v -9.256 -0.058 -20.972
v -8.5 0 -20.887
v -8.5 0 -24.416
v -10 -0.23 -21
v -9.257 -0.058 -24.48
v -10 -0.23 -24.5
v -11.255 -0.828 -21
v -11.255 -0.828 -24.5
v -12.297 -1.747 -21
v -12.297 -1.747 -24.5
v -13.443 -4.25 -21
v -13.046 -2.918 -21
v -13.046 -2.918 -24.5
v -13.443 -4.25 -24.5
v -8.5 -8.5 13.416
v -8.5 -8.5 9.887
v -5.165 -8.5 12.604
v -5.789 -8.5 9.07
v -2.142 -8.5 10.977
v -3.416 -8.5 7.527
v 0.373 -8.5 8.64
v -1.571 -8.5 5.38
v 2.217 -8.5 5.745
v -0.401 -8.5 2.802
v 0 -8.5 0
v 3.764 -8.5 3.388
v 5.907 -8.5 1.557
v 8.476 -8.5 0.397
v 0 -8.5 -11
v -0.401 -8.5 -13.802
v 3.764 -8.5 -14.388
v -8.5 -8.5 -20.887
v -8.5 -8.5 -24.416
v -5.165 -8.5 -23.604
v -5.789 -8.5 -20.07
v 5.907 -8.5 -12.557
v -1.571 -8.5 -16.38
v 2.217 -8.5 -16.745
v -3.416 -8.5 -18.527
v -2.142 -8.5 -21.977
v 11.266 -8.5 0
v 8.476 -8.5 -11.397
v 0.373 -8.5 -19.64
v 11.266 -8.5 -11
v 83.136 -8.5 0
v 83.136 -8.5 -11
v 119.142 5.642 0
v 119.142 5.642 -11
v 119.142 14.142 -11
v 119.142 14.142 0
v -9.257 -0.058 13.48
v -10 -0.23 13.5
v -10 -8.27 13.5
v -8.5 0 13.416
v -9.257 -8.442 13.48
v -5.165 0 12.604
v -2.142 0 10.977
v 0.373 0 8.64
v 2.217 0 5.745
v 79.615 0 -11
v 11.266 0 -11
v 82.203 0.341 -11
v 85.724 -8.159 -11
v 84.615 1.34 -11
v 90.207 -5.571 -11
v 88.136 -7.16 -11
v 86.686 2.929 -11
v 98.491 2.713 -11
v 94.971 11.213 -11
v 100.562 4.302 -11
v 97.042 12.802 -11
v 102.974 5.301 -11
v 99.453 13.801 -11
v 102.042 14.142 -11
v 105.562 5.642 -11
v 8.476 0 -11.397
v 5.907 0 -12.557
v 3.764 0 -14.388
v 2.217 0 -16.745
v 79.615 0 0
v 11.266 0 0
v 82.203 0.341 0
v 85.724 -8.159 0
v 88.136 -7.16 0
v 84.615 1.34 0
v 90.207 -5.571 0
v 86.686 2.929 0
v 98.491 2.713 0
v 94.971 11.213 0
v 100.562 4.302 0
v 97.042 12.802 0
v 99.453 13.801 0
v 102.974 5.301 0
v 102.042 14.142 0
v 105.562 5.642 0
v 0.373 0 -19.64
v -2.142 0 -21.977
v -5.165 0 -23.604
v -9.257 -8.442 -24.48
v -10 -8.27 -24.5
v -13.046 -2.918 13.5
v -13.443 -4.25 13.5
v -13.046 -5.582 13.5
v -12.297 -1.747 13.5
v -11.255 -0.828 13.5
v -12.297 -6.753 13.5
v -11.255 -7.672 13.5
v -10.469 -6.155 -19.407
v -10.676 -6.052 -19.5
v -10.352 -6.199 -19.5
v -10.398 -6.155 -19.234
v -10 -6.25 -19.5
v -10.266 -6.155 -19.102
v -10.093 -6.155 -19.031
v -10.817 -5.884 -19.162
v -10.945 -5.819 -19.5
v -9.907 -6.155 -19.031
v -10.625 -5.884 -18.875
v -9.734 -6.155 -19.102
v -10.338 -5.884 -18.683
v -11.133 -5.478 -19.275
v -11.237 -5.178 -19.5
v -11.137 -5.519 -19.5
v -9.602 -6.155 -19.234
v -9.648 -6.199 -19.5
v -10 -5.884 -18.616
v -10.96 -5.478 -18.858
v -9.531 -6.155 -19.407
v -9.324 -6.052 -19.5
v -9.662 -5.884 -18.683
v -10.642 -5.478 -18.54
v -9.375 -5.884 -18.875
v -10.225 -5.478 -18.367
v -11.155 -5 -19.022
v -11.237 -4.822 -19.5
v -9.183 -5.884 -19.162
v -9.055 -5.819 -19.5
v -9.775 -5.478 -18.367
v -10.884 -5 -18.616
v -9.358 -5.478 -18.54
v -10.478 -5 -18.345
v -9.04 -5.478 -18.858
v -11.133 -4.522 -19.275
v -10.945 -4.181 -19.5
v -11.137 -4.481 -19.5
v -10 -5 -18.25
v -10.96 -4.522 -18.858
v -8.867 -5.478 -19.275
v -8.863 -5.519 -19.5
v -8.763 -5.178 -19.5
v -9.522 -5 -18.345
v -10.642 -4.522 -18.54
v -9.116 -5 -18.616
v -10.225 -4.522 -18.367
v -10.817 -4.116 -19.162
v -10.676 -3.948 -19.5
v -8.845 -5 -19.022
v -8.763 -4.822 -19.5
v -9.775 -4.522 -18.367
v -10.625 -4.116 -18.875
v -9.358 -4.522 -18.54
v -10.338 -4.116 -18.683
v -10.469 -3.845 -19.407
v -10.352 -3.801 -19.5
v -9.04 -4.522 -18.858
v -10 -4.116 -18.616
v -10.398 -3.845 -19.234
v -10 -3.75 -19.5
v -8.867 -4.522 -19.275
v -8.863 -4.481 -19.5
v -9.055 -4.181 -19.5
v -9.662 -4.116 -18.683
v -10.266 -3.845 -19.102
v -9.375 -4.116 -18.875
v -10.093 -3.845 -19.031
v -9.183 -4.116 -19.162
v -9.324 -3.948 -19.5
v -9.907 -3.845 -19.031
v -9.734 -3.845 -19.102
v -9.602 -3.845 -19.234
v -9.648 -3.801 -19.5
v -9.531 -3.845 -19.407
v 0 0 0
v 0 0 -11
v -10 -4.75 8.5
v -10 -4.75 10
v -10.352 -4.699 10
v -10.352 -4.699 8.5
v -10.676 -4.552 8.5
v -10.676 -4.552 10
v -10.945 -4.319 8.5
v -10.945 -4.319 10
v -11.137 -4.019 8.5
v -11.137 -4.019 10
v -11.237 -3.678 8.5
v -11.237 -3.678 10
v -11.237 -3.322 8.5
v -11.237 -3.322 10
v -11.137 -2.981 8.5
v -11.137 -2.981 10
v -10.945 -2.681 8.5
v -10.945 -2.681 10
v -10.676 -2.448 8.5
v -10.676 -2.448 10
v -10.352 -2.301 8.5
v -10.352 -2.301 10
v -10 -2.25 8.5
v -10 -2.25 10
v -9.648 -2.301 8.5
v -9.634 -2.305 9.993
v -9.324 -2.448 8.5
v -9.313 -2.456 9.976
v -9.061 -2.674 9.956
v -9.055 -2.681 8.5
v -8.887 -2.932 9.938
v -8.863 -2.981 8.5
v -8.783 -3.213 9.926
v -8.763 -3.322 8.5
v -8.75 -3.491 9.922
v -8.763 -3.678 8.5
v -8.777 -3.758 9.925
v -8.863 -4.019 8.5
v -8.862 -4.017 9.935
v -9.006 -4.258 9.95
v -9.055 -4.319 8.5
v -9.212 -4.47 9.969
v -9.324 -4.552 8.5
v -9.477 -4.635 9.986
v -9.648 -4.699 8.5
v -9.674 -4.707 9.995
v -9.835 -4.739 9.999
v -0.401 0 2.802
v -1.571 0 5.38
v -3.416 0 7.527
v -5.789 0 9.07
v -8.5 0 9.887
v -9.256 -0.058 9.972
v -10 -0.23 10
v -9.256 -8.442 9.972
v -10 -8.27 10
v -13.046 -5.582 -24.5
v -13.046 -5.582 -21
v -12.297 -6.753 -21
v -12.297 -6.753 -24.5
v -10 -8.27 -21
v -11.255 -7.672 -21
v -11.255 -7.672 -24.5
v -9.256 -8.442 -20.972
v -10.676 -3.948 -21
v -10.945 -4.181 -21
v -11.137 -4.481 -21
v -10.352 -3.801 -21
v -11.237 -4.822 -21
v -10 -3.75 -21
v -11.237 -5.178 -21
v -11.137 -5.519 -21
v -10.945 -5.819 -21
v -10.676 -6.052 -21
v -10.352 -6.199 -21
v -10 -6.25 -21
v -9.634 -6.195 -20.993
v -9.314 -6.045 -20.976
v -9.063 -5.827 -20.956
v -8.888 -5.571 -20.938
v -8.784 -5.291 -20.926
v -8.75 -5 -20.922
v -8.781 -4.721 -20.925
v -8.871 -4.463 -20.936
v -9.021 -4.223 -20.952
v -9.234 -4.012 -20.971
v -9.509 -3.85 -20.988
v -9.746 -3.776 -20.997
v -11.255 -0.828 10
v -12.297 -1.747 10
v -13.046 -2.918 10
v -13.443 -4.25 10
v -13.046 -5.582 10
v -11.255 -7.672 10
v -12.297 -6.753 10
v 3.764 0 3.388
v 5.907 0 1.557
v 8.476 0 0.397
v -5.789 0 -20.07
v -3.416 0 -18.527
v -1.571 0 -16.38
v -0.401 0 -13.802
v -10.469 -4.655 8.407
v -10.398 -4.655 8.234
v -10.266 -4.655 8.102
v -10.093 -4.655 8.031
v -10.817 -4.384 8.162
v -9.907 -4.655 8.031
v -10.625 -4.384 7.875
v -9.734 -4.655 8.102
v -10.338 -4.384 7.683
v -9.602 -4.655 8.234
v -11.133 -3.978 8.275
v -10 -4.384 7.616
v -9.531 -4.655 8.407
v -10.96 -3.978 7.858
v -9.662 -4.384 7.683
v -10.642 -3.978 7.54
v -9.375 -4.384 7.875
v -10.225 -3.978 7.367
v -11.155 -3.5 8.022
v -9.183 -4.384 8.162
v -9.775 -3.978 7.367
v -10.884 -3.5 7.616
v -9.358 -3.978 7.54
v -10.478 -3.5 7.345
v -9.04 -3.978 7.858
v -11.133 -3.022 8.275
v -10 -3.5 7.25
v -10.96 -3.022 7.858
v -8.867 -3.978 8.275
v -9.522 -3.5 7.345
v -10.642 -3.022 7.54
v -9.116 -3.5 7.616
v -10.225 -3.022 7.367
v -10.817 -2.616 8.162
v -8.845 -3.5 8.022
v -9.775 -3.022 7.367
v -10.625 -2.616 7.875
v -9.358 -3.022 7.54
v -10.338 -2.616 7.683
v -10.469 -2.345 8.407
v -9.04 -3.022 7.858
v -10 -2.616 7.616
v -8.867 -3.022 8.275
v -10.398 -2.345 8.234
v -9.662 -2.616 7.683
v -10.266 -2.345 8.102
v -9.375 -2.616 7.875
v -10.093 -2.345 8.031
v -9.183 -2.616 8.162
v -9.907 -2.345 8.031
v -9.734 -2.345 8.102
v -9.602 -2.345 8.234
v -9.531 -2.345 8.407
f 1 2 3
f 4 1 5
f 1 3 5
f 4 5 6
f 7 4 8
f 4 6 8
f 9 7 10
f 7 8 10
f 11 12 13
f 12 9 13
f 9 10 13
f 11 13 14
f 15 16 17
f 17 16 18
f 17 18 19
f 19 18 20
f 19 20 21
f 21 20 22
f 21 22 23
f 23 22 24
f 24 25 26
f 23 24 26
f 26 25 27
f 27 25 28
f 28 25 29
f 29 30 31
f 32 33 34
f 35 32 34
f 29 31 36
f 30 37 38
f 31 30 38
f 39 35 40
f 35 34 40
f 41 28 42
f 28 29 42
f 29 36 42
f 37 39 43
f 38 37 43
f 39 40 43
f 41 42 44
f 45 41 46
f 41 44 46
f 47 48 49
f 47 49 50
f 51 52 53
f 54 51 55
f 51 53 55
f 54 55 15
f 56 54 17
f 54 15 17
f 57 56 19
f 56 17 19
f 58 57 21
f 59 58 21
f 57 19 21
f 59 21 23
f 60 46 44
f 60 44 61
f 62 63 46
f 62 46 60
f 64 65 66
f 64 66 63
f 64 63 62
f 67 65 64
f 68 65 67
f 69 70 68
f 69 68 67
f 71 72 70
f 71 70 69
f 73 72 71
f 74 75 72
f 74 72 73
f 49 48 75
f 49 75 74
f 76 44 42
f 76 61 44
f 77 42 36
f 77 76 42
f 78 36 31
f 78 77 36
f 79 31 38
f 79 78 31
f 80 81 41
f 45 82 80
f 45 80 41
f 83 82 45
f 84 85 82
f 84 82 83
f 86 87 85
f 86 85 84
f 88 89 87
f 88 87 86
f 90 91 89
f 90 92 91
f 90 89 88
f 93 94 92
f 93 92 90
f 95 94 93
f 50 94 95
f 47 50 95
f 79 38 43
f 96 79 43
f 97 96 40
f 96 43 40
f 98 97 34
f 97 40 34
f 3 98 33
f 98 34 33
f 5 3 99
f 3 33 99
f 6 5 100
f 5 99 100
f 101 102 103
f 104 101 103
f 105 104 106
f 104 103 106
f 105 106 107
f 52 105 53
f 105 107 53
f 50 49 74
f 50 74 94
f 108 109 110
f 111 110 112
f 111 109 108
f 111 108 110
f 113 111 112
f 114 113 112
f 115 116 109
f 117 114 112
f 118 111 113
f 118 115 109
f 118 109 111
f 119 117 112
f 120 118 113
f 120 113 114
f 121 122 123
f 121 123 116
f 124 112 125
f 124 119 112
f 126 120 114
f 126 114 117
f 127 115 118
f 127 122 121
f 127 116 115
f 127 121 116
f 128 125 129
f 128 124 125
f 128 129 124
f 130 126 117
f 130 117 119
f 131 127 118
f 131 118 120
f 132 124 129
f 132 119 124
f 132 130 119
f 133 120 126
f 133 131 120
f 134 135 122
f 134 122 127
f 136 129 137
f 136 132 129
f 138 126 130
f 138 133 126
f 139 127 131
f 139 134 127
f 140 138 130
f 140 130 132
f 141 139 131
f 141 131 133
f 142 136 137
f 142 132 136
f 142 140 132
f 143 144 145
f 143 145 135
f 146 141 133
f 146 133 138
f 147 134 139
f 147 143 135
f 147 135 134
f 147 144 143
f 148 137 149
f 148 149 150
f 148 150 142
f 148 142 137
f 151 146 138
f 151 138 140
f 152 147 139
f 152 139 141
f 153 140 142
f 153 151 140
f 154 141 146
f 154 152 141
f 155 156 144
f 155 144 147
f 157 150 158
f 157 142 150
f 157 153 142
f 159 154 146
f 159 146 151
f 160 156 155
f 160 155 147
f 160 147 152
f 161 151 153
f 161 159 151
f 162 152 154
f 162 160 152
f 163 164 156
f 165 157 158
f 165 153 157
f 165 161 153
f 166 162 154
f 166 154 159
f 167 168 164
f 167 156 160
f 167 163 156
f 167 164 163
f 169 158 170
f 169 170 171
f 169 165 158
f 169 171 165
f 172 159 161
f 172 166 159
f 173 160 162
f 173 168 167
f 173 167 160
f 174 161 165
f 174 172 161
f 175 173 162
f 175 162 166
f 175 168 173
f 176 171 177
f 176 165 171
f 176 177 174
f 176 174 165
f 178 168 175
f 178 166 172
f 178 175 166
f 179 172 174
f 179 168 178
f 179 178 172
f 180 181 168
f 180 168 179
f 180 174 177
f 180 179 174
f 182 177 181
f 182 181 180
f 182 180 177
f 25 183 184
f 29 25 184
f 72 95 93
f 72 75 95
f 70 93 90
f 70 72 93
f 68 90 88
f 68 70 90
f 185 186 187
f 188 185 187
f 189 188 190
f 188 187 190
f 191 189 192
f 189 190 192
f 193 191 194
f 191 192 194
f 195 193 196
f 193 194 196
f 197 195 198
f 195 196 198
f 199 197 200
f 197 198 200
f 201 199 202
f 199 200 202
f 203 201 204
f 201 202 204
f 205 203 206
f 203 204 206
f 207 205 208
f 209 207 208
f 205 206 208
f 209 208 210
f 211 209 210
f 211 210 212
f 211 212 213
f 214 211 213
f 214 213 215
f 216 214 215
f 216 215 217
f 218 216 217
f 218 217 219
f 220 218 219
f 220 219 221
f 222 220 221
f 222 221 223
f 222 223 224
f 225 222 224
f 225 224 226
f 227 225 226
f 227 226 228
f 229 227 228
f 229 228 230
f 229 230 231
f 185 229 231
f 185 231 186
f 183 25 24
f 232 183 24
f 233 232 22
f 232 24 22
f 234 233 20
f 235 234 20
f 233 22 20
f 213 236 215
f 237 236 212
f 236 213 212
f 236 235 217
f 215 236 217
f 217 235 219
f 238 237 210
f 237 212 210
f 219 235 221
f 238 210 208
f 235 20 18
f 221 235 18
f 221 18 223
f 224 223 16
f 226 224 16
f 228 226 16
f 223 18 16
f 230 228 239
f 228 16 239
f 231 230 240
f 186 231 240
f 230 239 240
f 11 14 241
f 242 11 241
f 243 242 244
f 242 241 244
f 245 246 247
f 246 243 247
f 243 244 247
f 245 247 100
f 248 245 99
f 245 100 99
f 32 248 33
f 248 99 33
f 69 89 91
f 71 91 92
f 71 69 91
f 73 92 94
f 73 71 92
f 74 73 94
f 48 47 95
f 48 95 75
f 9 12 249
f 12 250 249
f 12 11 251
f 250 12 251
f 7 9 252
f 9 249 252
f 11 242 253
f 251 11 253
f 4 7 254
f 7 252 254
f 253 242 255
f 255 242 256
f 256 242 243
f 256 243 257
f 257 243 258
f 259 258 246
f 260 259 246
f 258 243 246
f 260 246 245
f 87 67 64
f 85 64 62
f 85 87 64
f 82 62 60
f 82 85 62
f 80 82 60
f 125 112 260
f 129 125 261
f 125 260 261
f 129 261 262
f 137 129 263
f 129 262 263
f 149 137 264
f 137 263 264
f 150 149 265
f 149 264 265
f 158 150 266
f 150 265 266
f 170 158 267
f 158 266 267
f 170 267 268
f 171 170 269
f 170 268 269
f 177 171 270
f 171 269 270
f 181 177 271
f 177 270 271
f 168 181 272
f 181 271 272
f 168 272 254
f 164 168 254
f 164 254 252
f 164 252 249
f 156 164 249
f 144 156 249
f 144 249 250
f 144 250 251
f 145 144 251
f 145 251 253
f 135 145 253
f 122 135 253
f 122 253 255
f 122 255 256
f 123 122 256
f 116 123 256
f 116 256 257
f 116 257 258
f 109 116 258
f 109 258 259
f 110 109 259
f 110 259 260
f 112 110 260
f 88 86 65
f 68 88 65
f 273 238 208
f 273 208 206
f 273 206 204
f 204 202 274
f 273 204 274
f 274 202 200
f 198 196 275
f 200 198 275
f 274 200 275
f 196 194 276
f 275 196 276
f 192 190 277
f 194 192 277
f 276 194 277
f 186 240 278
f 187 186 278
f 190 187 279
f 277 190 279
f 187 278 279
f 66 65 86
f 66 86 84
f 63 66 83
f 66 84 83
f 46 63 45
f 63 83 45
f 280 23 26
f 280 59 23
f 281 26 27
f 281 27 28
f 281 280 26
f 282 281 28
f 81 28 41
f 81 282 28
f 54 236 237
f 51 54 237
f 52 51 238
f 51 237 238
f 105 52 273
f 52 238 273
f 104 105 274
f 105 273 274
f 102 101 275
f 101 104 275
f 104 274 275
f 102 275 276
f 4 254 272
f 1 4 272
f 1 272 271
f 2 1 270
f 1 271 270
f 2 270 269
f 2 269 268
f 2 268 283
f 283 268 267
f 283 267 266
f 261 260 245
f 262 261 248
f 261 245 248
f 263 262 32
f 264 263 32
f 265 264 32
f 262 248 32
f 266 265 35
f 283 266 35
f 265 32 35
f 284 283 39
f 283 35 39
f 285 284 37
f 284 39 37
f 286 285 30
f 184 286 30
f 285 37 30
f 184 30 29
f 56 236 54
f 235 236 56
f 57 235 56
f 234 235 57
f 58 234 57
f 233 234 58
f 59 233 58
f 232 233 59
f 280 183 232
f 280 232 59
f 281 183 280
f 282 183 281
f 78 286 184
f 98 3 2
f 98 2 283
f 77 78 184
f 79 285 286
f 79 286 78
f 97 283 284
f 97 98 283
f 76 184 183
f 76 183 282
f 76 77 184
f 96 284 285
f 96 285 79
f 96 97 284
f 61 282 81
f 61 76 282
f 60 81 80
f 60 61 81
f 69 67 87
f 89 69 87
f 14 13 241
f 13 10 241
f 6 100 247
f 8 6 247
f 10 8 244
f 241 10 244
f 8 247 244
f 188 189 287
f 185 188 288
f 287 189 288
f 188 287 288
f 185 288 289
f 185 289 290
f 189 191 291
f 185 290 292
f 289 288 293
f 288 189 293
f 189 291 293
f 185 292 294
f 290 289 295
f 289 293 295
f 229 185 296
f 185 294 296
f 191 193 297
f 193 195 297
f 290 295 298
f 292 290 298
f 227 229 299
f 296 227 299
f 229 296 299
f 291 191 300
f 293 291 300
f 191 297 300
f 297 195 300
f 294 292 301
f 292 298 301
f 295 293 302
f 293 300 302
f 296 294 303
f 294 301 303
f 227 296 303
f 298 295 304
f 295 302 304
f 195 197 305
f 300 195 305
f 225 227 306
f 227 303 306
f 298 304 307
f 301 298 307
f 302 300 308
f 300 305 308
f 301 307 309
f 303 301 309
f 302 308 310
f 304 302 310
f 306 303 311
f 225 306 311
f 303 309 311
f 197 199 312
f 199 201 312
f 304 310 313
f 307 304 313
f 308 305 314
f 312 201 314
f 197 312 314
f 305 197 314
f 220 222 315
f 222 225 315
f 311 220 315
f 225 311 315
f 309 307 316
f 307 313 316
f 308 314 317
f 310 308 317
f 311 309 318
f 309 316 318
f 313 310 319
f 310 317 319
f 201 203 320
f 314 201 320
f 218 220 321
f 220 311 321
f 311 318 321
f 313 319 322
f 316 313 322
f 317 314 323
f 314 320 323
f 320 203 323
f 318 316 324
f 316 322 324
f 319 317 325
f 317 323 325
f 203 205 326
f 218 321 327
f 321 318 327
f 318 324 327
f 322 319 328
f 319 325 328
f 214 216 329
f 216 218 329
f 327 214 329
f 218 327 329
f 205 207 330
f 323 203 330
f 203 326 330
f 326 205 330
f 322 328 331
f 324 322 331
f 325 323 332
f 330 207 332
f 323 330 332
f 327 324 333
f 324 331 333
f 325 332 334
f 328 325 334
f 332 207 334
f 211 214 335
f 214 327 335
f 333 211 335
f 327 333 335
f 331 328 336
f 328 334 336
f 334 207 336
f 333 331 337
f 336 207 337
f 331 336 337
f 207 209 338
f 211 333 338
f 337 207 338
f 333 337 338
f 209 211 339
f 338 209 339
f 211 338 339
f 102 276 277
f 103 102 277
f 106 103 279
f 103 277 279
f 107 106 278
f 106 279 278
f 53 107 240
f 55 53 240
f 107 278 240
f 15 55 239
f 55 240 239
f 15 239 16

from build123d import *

# Parameters (mm, degrees)
SKETCH1_W           = 11
SKETCH1_H           = 8.5
BOSS_EXTRUDE1_DEPTH = 75
SKETCH14_W          = 11
SKETCH14_H          = 8.5
FILLET1_R           = 10
BOSS_EXTRUDE3_START = -8.5
BOSS_EXTRUDE3_DEPTH = 8.5
FILLET5_R           = 10
FILLET6_R           = 5
SKETCH18_R          = 1.25
BOSS_EXTRUDE4_DEPTH = 1.5
SKETCH19_R          = 1.25
BOSS_EXTRUDE5_DEPTH = 1.5
REVOLVE9_ANGLE      = 180
REVOLVE10_ANGLE     = 180


with BuildPart() as part:
    # Sketch1 → Boss-Extrude1 (new body)
    with BuildSketch(Plane(origin=(0, 0, 0), x_dir=(0, 0, -1), z_dir=(1, 0, 0))):
        with Locations((5.5, -4.25)):
            Rectangle(SKETCH1_W, SKETCH1_H)
    extrude(amount=BOSS_EXTRUDE1_DEPTH)

    # Sweep3: sweep along a curve in space
    with BuildLine() as sweep3_path:
        Line((75, -3, -5.5), (85, -3, -5.5))
        Line((85, -3, -5.5), (99.142135624, 11.142135624, -5.5))
        Line((99.142135624, 11.142135624, -5.5), (119.142135624, 11.142135624, -5.5))
    # Sketch14 → Sweep3 (sweep)
    with BuildSketch(Plane(origin=(75, 0, 0), x_dir=(0, 0, -1), z_dir=(1, 0, 0))):
        with Locations((5.5, -4.25)):
            Rectangle(SKETCH14_W, SKETCH14_H)
    sweep(path=sweep3_path.line, transition=Transition.RIGHT)

    # Fillet1
    fillet1_edges = [part.edges().sort_by_distance(p)[0] for p in [
        (97.899494937, 14.142135624, -5.5),
        (101.420310217, 5.642135624, -5.5),
        (83.757359313, 0, -5.5),
        (87.278174593, -8.5, -5.5),
    ]]
    fillet(fillet1_edges, radius=FILLET1_R)

    # Sketch17 → Boss-Extrude3 (add)
    with BuildSketch(Plane(origin=(0, 0, 0), x_dir=(1, 0, 0), z_dir=(0, 1, 0)).offset(BOSS_EXTRUDE3_START)):
        with BuildLine():
            Line((-10, -10), (-13.5, -10))
            Line((-13.5, -10), (-13.5, -13.5))
            Line((-13.5, -13.5), (-10, -13.5))
            ThreePointArc((-10, -13.5), (-0.454058454, -9.545941546), (3.5, 0))
            Line((3.5, 0), (3.5, 11))
            ThreePointArc((3.5, 11), (-0.454058454, 20.545941546), (-10, 24.5))
            Line((-10, 24.5), (-13.5, 24.5))
            Line((-13.5, 24.5), (-13.5, 21))
            Line((-13.5, 21), (-10, 21))
            ThreePointArc((-10, 21), (-2.928932188, 18.071067812), (0, 11))
            Line((0, 11), (0, 0))
            ThreePointArc((0, 0), (-2.928932188, -7.071067812), (-10, -10))
        make_face()
    extrude(amount=BOSS_EXTRUDE3_DEPTH)

    # Fillet5
    fillet5_edges = [part.edges().sort_by_distance(p)[0] for p in [
        (3.5, -4.25, 0),
        (3.5, -4.25, -11),
    ]]
    fillet(fillet5_edges, radius=FILLET5_R)

    # Fillet6
    # the kernel refuses this fillet: 5 mm, written as the material it takes off along each edge
    with BuildSketch(Plane(origin=(-13.5, -8.5, -2.5), x_dir=(0, 1, 0), z_dir=(0, 0, 1)), Plane(origin=(-13.5, 0, -2.5), x_dir=(1, 0, 0), z_dir=(0, 0, 1)), Plane(origin=(-13.5, -8.5, -37), x_dir=(0, 1, 0), z_dir=(0, 0, 1)), Plane(origin=(-13.5, 0, -37), x_dir=(1, 0, 0), z_dir=(0, 0, 1))) as fillet6_piece_1:
        with BuildLine():
            CenterArc((FILLET6_R, -FILLET6_R), FILLET6_R, 90, 90)
            Line((0, -FILLET6_R), (0, 0))
            Line((0, 0), (FILLET6_R, 0))
        make_face()
    extrude(amount=28.5, mode=Mode.SUBTRACT)

    # Sketch18 → Boss-Extrude4 (add)
    with BuildSketch(Plane.XY.offset(-21)):
        with Locations(Location((-10, -5, 0), (0, 0, 270))):
            Circle(SKETCH18_R)
    extrude(amount=BOSS_EXTRUDE4_DEPTH)

    # Sketch19 → Boss-Extrude5 (add)
    with BuildSketch(Plane(origin=(0, 0, 10), x_dir=(-1, 0, 0), z_dir=(0, 0, -1))):
        with Locations(Location((10, -3.5, 0), (0, 0, 269.999999996))):
            Circle(SKETCH19_R)
    extrude(amount=BOSS_EXTRUDE5_DEPTH)

    # Sketch24 → Revolve9 (revolve)
    with BuildSketch(Plane(origin=(0, 0, 8.5), x_dir=(-1, 0, 0), z_dir=(0, 0, -1))):
        with BuildLine():
            Line((10, -2.25), (10, -4.75))
            ThreePointArc((10, -4.75), (11.25, -3.5), (10, -2.25))
        make_face()
    revolve(axis=Axis((-10, -2.25, 8.5), (0, -1, 0)), revolution_arc=REVOLVE9_ANGLE)

    # Sketch25 → Revolve10 (revolve)
    with BuildSketch(Plane.XY.offset(-19.5)):
        with BuildLine():
            Line((-10, -3.75), (-10, -6.25))
            ThreePointArc((-10, -6.25), (-11.25, -5), (-10, -3.75))
        make_face()
    revolve(axis=Axis((-10, -3.75, -19.5), (0, 1, 0)), revolution_arc=REVOLVE10_ANGLE)


solid = part.part
